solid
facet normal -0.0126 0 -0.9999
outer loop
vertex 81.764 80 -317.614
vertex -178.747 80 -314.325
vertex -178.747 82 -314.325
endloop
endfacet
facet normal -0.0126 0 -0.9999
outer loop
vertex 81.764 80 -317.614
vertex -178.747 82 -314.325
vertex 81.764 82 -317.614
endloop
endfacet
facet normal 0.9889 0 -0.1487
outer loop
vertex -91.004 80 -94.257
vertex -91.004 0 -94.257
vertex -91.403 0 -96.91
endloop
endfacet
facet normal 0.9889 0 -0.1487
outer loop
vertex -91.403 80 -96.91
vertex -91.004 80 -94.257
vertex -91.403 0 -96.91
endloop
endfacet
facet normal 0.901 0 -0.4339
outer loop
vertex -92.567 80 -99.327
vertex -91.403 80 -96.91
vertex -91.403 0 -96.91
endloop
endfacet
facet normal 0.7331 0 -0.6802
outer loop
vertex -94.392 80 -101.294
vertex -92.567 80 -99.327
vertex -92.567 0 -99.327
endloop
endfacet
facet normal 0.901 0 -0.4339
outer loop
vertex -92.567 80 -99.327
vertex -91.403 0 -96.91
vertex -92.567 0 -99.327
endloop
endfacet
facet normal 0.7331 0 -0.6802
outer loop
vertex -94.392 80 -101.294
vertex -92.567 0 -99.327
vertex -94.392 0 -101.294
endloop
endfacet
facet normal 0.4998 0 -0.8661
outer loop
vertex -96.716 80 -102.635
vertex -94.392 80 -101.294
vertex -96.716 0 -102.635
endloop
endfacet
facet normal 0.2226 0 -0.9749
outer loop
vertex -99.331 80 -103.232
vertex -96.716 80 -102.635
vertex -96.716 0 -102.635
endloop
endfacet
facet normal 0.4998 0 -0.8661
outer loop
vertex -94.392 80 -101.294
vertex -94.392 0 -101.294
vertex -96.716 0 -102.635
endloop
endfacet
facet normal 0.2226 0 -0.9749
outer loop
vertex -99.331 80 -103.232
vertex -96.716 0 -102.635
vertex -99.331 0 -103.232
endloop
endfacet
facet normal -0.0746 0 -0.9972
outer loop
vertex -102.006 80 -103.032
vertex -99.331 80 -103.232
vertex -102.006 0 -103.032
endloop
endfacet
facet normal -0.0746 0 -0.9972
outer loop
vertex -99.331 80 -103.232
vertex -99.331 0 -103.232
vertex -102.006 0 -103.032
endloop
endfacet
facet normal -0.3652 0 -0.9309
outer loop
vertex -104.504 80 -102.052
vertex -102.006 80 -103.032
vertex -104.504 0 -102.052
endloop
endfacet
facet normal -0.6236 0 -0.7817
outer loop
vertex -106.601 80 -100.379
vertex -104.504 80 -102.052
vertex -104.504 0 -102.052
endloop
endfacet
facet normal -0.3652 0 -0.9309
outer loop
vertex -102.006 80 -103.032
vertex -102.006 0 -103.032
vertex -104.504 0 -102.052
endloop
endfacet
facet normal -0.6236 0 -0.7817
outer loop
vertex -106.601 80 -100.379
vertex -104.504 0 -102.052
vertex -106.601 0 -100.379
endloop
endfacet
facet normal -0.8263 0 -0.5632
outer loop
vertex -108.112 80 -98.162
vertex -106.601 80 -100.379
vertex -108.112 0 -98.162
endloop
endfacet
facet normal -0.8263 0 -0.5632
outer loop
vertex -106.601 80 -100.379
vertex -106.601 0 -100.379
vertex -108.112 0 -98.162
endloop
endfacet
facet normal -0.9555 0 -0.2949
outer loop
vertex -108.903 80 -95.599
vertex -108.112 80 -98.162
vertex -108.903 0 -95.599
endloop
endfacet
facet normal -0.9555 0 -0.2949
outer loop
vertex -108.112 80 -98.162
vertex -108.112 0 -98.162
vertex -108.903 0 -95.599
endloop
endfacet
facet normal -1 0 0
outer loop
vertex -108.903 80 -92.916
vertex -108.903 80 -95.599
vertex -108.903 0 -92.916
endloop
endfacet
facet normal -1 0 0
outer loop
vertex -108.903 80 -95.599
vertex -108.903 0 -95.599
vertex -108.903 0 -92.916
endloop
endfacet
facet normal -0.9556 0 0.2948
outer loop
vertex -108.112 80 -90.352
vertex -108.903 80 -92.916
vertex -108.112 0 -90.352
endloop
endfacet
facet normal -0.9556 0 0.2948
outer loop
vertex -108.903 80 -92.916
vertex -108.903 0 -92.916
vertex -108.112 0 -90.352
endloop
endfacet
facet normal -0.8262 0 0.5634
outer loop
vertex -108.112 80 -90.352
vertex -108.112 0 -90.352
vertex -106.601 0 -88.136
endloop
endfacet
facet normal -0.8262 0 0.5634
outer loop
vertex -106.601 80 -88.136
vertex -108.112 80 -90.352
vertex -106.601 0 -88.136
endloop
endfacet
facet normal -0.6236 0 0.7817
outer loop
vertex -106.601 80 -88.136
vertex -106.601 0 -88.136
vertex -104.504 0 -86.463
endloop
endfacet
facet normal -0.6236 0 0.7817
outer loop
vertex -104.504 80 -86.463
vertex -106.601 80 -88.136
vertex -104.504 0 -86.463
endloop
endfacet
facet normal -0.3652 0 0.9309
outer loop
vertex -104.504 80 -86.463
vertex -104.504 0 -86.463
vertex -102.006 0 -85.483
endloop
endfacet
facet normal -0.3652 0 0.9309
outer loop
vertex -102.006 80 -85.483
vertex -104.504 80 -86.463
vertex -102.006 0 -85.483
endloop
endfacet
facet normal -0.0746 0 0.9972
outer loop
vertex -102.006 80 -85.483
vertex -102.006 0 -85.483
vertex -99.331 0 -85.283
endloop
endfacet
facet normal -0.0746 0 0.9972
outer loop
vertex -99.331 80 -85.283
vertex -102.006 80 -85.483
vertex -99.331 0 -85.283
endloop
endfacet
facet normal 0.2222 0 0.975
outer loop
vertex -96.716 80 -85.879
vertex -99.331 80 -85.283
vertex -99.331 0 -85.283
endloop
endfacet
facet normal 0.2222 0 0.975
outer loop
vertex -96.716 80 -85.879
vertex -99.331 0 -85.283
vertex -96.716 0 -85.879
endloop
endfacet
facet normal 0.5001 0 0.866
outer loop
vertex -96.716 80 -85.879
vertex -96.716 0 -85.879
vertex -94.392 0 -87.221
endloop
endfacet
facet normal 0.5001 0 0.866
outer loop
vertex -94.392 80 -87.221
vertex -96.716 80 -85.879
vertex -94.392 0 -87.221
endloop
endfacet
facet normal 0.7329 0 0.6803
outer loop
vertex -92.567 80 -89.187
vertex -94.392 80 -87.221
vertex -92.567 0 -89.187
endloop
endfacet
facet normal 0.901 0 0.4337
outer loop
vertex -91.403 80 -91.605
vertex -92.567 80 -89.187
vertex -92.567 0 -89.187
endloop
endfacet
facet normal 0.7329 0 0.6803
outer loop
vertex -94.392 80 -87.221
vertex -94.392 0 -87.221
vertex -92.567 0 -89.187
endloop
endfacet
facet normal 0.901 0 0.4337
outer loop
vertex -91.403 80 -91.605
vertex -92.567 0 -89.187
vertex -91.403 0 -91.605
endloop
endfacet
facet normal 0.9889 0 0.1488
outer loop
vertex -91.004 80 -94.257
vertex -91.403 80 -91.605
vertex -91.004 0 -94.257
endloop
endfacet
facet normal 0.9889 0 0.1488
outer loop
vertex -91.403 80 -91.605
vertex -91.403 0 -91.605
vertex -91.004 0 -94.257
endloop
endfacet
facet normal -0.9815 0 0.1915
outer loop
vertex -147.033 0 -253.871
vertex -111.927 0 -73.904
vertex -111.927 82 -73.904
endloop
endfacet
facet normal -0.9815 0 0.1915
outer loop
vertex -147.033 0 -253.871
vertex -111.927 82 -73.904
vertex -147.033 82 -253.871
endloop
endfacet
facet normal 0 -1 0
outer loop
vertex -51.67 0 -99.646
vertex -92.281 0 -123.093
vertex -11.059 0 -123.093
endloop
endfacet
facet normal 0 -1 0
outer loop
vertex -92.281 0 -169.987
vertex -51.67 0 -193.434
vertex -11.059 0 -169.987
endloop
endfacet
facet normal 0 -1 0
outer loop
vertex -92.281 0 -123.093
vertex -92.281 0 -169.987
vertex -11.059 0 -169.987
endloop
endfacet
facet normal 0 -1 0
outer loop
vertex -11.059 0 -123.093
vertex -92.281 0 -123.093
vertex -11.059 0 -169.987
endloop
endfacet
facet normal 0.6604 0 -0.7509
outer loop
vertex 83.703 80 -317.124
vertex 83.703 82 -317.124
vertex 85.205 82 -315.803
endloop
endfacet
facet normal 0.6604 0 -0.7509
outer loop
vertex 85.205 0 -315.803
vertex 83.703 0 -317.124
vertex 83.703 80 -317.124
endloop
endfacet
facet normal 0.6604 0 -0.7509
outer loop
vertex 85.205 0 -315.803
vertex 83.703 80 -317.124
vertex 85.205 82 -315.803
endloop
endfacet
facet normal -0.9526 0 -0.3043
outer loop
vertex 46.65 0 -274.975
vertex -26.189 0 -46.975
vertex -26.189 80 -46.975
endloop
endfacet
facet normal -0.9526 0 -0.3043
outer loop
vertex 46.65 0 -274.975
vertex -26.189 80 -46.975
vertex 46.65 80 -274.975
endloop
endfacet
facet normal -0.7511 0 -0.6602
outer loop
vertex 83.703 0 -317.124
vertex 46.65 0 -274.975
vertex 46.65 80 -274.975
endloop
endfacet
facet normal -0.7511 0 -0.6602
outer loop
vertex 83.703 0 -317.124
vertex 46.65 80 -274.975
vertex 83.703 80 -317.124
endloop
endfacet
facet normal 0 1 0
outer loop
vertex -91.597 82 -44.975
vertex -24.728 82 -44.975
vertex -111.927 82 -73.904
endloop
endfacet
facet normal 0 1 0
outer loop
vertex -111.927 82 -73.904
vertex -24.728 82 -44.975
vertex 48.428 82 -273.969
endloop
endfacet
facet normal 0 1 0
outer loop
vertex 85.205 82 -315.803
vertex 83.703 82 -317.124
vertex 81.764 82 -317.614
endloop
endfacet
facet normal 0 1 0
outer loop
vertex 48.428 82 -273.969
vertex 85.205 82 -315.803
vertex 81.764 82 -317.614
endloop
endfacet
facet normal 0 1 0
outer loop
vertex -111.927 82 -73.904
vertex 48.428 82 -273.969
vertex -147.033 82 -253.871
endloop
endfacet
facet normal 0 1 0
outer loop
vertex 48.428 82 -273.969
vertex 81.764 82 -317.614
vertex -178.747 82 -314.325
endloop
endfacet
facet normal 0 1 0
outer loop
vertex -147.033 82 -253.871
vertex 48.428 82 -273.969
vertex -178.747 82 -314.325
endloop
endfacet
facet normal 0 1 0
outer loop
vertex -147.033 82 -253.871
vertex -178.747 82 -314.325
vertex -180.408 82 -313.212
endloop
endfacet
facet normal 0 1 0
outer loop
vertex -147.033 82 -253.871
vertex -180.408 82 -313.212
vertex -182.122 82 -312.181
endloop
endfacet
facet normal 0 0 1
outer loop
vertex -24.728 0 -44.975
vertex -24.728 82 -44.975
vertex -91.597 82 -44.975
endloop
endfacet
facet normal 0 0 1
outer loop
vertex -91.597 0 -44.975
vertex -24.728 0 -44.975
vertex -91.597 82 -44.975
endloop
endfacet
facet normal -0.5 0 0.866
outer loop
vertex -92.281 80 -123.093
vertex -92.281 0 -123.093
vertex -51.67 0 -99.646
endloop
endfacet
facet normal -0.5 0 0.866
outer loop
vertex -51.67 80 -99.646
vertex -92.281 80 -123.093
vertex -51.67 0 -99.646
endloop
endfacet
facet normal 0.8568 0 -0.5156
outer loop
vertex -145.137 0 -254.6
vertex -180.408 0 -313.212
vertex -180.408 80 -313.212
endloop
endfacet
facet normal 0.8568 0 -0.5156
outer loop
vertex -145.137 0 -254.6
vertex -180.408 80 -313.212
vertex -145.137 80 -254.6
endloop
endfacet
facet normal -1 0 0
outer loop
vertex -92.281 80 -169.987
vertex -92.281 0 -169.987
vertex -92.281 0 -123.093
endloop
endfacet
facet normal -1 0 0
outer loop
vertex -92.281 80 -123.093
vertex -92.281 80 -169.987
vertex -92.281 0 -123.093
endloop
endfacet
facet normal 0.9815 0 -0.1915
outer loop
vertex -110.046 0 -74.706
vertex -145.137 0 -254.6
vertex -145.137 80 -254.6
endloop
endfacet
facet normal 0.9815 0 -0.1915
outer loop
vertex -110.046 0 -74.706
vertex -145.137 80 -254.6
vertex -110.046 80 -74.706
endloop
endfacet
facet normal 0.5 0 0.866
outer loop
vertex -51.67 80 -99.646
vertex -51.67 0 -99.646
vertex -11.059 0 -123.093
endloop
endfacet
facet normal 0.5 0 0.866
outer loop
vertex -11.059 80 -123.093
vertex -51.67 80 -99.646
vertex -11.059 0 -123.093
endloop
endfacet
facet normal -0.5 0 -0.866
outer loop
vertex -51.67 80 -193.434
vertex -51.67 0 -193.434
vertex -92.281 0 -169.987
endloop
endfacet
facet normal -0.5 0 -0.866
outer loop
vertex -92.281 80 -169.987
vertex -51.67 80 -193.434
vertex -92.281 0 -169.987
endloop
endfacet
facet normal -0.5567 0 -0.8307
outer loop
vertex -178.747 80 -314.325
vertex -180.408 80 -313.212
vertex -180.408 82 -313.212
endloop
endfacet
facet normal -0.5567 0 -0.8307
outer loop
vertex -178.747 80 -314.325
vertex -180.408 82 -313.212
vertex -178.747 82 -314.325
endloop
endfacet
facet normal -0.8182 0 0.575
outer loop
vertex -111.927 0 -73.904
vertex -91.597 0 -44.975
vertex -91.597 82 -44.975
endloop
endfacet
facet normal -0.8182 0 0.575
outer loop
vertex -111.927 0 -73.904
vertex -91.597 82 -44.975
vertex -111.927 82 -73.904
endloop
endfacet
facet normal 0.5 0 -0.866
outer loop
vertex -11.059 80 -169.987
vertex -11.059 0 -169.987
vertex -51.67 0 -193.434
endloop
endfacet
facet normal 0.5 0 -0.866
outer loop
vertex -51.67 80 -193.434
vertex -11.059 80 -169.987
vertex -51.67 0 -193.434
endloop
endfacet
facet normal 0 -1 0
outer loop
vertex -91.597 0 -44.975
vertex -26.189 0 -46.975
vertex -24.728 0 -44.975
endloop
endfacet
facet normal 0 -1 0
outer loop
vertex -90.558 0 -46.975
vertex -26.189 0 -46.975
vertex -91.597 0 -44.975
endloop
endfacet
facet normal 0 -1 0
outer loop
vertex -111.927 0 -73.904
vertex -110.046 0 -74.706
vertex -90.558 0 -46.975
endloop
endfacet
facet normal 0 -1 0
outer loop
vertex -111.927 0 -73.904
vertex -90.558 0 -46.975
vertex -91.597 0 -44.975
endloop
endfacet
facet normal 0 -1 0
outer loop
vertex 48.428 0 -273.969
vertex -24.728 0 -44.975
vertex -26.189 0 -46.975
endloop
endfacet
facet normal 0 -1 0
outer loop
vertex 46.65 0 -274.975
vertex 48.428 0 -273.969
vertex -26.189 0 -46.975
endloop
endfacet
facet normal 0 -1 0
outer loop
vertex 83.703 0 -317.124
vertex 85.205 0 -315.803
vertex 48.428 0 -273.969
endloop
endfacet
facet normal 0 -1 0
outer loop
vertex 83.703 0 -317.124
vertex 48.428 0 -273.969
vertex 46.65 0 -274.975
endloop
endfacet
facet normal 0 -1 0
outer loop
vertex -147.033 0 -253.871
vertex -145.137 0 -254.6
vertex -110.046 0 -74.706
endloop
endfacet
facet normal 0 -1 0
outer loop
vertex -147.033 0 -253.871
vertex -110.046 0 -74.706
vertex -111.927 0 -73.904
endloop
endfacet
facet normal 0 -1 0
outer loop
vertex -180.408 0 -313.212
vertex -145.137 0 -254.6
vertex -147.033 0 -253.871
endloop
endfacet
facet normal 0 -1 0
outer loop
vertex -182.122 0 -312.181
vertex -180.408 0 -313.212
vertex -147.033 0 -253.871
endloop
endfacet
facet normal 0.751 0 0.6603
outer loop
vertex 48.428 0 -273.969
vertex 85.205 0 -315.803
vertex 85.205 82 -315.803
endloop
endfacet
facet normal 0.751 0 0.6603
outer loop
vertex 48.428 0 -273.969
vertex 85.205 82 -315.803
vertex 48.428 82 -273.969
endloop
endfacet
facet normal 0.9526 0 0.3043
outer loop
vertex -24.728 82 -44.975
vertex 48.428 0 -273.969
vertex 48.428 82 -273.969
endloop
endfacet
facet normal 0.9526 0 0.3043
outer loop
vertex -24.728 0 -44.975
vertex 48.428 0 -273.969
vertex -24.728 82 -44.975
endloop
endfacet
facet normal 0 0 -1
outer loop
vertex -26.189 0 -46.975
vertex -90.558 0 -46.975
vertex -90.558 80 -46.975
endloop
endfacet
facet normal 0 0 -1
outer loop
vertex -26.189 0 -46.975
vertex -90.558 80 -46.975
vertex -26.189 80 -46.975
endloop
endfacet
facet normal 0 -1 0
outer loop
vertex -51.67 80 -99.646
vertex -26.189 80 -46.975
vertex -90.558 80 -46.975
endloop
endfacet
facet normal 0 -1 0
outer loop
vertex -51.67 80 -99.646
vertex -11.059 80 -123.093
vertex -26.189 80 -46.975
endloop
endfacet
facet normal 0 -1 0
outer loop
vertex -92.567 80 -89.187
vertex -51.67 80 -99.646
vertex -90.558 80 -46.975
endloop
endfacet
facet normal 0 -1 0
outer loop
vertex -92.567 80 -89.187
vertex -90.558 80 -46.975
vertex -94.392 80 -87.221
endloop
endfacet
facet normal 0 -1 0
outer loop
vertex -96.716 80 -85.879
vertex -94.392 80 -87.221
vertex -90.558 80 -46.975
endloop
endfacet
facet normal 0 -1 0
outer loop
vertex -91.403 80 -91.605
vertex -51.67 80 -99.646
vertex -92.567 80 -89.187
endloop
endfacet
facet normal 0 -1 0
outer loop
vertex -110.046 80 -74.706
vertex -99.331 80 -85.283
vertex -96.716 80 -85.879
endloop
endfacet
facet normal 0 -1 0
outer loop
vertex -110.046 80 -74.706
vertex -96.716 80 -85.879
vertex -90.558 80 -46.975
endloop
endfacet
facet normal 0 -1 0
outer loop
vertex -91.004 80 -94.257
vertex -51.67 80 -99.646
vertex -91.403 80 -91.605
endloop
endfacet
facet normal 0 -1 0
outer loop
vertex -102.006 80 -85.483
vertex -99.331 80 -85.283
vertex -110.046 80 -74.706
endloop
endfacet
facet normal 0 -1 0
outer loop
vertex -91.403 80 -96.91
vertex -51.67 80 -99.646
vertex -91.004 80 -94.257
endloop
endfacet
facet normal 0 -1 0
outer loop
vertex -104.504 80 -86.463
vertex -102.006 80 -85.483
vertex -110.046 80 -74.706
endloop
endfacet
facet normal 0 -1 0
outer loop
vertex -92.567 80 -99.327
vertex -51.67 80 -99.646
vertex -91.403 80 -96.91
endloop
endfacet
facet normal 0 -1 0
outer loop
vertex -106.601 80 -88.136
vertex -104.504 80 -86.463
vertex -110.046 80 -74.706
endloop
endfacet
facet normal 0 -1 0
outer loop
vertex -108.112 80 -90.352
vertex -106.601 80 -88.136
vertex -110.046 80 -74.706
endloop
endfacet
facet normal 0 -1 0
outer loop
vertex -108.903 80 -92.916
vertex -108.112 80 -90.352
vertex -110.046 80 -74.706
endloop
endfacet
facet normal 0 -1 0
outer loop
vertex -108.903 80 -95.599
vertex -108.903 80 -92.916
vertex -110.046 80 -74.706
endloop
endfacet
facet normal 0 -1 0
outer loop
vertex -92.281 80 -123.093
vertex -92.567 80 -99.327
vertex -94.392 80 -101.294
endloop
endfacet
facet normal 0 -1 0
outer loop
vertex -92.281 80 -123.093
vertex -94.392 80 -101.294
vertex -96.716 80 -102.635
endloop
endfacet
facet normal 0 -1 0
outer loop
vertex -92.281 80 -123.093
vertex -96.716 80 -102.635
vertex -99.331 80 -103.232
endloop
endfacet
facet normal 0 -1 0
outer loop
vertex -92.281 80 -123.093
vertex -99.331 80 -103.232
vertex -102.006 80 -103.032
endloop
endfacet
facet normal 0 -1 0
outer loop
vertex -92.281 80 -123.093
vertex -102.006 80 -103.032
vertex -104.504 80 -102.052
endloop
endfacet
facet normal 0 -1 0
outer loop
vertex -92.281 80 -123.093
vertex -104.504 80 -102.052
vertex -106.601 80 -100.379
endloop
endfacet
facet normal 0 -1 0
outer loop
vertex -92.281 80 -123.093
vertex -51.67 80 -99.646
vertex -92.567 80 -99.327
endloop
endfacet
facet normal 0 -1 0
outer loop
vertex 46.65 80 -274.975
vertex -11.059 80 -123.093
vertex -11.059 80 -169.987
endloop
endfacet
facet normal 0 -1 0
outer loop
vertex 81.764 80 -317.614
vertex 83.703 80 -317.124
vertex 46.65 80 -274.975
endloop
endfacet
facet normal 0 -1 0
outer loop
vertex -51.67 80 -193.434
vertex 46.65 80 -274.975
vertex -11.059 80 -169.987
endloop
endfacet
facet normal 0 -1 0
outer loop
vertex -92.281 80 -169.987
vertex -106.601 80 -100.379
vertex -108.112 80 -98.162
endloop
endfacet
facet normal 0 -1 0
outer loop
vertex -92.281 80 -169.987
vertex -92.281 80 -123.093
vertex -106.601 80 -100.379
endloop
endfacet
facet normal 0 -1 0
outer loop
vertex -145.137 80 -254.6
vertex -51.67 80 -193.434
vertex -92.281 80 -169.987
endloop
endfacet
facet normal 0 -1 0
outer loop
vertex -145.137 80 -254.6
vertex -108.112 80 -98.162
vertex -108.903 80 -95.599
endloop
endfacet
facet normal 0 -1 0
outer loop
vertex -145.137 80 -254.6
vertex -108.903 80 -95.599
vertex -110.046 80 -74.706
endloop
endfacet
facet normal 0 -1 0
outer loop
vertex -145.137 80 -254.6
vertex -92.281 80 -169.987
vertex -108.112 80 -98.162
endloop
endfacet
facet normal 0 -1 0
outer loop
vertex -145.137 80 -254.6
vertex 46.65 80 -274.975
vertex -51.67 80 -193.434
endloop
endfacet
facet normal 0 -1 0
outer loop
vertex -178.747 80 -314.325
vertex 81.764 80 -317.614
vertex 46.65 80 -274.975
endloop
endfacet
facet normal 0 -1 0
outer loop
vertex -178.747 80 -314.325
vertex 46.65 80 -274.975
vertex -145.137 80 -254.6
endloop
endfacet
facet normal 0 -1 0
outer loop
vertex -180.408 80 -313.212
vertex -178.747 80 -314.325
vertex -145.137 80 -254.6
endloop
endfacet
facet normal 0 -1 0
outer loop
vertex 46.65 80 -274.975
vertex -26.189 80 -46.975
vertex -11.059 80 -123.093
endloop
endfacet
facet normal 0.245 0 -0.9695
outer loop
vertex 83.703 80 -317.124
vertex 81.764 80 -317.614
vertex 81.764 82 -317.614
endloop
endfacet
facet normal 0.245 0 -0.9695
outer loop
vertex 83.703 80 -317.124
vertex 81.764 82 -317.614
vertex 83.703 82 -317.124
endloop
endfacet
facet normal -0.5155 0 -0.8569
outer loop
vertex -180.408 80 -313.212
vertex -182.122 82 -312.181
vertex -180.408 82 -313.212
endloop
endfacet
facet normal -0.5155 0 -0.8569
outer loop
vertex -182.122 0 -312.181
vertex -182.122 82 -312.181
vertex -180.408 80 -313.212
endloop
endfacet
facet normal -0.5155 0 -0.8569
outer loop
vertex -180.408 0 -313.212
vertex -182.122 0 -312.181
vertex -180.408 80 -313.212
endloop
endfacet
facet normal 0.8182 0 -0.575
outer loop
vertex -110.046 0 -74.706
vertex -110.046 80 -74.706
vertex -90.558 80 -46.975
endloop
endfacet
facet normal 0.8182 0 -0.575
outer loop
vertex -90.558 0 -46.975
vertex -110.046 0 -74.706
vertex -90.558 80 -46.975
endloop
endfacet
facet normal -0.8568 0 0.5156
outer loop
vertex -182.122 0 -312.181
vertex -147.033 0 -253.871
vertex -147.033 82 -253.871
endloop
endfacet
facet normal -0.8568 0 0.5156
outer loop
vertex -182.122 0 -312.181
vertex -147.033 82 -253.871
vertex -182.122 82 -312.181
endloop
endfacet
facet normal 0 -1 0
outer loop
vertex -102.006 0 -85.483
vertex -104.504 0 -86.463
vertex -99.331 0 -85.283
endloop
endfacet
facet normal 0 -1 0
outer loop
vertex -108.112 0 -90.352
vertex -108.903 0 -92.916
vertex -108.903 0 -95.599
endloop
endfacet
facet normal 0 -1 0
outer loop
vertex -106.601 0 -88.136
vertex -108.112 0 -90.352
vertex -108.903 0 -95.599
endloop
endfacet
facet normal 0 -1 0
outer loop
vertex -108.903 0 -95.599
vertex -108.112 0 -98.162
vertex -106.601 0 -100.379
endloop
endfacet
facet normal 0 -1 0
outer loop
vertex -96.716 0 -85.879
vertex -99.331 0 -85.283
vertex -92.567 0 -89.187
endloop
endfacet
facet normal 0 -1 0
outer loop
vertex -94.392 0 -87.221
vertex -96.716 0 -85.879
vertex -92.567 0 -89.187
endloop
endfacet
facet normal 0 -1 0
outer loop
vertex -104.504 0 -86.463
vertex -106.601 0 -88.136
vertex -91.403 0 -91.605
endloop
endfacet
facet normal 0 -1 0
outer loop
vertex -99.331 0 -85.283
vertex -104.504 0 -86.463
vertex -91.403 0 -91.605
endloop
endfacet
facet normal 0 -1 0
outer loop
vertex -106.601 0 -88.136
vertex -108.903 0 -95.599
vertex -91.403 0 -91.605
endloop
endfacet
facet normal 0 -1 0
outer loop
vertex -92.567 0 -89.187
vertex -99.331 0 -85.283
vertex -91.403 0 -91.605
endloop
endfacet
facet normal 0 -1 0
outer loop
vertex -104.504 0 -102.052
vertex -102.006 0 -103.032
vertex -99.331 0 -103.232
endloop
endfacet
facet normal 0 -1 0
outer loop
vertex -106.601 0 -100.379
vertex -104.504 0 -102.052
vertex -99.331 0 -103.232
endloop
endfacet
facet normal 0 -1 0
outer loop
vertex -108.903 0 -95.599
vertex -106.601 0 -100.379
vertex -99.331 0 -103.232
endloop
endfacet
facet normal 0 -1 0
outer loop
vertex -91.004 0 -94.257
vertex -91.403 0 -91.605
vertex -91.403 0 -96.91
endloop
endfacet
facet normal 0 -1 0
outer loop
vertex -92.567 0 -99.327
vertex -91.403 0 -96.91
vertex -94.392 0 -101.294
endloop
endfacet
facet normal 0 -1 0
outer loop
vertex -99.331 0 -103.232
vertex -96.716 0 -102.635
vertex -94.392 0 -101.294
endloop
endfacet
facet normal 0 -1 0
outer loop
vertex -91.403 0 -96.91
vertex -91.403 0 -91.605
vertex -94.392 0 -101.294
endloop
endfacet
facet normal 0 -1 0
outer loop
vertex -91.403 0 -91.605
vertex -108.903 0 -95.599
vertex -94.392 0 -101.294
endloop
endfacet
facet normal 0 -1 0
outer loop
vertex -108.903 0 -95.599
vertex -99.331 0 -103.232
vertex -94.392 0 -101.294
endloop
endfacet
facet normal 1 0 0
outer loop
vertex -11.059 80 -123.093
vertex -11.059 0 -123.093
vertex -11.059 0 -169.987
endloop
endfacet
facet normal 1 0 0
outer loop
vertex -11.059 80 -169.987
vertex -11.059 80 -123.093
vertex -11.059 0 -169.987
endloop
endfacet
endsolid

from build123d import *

# Parameters (mm, degrees)
SKETCH_2_R        = 9
EXTRUDE_1_DEPTH   = 80
EXTRUDE_1_2_DEPTH = 80
EXTRUDE_1_3_DEPTH = 80
EXTRUDE_2_DEPTH   = 2


with BuildPart() as part:
    # 草图2 → 凸台-拉伸1 (new body)
    with BuildSketch(Plane(origin=(0, 0, 0), x_dir=(1, 0, 0), z_dir=(0, 1, 0))):
        with Locations((-100.00360092, 94.257346069)):
            Circle(SKETCH_2_R)
    extrude(amount=EXTRUDE_1_DEPTH)



with BuildPart() as body_2:
    # 草图2 → Extrude 1 2 (new body)
    with BuildSketch(Plane(origin=(0, 0, 0), x_dir=(1, 0, 0), z_dir=(0, 1, 0))):
        Polygon((-180.407965552, 313.211742037), (-145.137395052, 254.599587646), (-110.045954215, 74.705720884), (-90.558125094, 46.975459978), (-26.188648694, 46.975459978), (46.650236815, 274.975459978), (83.703115643, 317.123903245), (85.205209719, 315.803405844), (48.428218628, 273.968790786), (-24.728005079, 44.975459978), (-91.597082511, 44.975459978), (-111.927353435, 73.904475802), (-147.032877617, 253.870539869), (-182.121617812, 312.180531131), align=None)
    extrude(amount=EXTRUDE_1_2_DEPTH)


with BuildPart() as body_3:
    # 草图2 → Extrude 1 3 (new body)
    with BuildSketch(Plane(origin=(0, 0, 0), x_dir=(1, 0, 0), z_dir=(0, 1, 0))):
        Polygon((-51.670033073, 193.433505049), (-92.281031996, 169.986733889), (-92.281031996, 123.093191569), (-51.670033073, 99.646420409), (-11.059034151, 123.093191569), (-11.059034151, 169.986733889), align=None)
    extrude(amount=EXTRUDE_1_3_DEPTH)


with BuildPart() as part_1:
    add(part.part)

    add(body_2.part)  # 凸台-拉伸2 merges body 2

    add(body_3.part)  # 凸台-拉伸2 merges body 3
    # 草图3 → 凸台-拉伸2 (add)
    with BuildSketch(Plane(origin=(0, 80, 0), x_dir=(1, 0, 0), z_dir=(0, 1, 0))):
        Polygon((-178.746676914, 314.325348818), (81.764058494, 317.613859747), (83.703115643, 317.123903245), (85.205209719, 315.803405844), (48.428218628, 273.968790786), (-24.728005079, 44.975459978), (-91.597082511, 44.975459978), (-111.927353435, 73.904475802), (-147.032877617, 253.870539869), (-182.121617812, 312.180531131), (-180.407965552, 313.211742037), align=None)
    extrude(amount=EXTRUDE_2_DEPTH)


solid = part_1.part
